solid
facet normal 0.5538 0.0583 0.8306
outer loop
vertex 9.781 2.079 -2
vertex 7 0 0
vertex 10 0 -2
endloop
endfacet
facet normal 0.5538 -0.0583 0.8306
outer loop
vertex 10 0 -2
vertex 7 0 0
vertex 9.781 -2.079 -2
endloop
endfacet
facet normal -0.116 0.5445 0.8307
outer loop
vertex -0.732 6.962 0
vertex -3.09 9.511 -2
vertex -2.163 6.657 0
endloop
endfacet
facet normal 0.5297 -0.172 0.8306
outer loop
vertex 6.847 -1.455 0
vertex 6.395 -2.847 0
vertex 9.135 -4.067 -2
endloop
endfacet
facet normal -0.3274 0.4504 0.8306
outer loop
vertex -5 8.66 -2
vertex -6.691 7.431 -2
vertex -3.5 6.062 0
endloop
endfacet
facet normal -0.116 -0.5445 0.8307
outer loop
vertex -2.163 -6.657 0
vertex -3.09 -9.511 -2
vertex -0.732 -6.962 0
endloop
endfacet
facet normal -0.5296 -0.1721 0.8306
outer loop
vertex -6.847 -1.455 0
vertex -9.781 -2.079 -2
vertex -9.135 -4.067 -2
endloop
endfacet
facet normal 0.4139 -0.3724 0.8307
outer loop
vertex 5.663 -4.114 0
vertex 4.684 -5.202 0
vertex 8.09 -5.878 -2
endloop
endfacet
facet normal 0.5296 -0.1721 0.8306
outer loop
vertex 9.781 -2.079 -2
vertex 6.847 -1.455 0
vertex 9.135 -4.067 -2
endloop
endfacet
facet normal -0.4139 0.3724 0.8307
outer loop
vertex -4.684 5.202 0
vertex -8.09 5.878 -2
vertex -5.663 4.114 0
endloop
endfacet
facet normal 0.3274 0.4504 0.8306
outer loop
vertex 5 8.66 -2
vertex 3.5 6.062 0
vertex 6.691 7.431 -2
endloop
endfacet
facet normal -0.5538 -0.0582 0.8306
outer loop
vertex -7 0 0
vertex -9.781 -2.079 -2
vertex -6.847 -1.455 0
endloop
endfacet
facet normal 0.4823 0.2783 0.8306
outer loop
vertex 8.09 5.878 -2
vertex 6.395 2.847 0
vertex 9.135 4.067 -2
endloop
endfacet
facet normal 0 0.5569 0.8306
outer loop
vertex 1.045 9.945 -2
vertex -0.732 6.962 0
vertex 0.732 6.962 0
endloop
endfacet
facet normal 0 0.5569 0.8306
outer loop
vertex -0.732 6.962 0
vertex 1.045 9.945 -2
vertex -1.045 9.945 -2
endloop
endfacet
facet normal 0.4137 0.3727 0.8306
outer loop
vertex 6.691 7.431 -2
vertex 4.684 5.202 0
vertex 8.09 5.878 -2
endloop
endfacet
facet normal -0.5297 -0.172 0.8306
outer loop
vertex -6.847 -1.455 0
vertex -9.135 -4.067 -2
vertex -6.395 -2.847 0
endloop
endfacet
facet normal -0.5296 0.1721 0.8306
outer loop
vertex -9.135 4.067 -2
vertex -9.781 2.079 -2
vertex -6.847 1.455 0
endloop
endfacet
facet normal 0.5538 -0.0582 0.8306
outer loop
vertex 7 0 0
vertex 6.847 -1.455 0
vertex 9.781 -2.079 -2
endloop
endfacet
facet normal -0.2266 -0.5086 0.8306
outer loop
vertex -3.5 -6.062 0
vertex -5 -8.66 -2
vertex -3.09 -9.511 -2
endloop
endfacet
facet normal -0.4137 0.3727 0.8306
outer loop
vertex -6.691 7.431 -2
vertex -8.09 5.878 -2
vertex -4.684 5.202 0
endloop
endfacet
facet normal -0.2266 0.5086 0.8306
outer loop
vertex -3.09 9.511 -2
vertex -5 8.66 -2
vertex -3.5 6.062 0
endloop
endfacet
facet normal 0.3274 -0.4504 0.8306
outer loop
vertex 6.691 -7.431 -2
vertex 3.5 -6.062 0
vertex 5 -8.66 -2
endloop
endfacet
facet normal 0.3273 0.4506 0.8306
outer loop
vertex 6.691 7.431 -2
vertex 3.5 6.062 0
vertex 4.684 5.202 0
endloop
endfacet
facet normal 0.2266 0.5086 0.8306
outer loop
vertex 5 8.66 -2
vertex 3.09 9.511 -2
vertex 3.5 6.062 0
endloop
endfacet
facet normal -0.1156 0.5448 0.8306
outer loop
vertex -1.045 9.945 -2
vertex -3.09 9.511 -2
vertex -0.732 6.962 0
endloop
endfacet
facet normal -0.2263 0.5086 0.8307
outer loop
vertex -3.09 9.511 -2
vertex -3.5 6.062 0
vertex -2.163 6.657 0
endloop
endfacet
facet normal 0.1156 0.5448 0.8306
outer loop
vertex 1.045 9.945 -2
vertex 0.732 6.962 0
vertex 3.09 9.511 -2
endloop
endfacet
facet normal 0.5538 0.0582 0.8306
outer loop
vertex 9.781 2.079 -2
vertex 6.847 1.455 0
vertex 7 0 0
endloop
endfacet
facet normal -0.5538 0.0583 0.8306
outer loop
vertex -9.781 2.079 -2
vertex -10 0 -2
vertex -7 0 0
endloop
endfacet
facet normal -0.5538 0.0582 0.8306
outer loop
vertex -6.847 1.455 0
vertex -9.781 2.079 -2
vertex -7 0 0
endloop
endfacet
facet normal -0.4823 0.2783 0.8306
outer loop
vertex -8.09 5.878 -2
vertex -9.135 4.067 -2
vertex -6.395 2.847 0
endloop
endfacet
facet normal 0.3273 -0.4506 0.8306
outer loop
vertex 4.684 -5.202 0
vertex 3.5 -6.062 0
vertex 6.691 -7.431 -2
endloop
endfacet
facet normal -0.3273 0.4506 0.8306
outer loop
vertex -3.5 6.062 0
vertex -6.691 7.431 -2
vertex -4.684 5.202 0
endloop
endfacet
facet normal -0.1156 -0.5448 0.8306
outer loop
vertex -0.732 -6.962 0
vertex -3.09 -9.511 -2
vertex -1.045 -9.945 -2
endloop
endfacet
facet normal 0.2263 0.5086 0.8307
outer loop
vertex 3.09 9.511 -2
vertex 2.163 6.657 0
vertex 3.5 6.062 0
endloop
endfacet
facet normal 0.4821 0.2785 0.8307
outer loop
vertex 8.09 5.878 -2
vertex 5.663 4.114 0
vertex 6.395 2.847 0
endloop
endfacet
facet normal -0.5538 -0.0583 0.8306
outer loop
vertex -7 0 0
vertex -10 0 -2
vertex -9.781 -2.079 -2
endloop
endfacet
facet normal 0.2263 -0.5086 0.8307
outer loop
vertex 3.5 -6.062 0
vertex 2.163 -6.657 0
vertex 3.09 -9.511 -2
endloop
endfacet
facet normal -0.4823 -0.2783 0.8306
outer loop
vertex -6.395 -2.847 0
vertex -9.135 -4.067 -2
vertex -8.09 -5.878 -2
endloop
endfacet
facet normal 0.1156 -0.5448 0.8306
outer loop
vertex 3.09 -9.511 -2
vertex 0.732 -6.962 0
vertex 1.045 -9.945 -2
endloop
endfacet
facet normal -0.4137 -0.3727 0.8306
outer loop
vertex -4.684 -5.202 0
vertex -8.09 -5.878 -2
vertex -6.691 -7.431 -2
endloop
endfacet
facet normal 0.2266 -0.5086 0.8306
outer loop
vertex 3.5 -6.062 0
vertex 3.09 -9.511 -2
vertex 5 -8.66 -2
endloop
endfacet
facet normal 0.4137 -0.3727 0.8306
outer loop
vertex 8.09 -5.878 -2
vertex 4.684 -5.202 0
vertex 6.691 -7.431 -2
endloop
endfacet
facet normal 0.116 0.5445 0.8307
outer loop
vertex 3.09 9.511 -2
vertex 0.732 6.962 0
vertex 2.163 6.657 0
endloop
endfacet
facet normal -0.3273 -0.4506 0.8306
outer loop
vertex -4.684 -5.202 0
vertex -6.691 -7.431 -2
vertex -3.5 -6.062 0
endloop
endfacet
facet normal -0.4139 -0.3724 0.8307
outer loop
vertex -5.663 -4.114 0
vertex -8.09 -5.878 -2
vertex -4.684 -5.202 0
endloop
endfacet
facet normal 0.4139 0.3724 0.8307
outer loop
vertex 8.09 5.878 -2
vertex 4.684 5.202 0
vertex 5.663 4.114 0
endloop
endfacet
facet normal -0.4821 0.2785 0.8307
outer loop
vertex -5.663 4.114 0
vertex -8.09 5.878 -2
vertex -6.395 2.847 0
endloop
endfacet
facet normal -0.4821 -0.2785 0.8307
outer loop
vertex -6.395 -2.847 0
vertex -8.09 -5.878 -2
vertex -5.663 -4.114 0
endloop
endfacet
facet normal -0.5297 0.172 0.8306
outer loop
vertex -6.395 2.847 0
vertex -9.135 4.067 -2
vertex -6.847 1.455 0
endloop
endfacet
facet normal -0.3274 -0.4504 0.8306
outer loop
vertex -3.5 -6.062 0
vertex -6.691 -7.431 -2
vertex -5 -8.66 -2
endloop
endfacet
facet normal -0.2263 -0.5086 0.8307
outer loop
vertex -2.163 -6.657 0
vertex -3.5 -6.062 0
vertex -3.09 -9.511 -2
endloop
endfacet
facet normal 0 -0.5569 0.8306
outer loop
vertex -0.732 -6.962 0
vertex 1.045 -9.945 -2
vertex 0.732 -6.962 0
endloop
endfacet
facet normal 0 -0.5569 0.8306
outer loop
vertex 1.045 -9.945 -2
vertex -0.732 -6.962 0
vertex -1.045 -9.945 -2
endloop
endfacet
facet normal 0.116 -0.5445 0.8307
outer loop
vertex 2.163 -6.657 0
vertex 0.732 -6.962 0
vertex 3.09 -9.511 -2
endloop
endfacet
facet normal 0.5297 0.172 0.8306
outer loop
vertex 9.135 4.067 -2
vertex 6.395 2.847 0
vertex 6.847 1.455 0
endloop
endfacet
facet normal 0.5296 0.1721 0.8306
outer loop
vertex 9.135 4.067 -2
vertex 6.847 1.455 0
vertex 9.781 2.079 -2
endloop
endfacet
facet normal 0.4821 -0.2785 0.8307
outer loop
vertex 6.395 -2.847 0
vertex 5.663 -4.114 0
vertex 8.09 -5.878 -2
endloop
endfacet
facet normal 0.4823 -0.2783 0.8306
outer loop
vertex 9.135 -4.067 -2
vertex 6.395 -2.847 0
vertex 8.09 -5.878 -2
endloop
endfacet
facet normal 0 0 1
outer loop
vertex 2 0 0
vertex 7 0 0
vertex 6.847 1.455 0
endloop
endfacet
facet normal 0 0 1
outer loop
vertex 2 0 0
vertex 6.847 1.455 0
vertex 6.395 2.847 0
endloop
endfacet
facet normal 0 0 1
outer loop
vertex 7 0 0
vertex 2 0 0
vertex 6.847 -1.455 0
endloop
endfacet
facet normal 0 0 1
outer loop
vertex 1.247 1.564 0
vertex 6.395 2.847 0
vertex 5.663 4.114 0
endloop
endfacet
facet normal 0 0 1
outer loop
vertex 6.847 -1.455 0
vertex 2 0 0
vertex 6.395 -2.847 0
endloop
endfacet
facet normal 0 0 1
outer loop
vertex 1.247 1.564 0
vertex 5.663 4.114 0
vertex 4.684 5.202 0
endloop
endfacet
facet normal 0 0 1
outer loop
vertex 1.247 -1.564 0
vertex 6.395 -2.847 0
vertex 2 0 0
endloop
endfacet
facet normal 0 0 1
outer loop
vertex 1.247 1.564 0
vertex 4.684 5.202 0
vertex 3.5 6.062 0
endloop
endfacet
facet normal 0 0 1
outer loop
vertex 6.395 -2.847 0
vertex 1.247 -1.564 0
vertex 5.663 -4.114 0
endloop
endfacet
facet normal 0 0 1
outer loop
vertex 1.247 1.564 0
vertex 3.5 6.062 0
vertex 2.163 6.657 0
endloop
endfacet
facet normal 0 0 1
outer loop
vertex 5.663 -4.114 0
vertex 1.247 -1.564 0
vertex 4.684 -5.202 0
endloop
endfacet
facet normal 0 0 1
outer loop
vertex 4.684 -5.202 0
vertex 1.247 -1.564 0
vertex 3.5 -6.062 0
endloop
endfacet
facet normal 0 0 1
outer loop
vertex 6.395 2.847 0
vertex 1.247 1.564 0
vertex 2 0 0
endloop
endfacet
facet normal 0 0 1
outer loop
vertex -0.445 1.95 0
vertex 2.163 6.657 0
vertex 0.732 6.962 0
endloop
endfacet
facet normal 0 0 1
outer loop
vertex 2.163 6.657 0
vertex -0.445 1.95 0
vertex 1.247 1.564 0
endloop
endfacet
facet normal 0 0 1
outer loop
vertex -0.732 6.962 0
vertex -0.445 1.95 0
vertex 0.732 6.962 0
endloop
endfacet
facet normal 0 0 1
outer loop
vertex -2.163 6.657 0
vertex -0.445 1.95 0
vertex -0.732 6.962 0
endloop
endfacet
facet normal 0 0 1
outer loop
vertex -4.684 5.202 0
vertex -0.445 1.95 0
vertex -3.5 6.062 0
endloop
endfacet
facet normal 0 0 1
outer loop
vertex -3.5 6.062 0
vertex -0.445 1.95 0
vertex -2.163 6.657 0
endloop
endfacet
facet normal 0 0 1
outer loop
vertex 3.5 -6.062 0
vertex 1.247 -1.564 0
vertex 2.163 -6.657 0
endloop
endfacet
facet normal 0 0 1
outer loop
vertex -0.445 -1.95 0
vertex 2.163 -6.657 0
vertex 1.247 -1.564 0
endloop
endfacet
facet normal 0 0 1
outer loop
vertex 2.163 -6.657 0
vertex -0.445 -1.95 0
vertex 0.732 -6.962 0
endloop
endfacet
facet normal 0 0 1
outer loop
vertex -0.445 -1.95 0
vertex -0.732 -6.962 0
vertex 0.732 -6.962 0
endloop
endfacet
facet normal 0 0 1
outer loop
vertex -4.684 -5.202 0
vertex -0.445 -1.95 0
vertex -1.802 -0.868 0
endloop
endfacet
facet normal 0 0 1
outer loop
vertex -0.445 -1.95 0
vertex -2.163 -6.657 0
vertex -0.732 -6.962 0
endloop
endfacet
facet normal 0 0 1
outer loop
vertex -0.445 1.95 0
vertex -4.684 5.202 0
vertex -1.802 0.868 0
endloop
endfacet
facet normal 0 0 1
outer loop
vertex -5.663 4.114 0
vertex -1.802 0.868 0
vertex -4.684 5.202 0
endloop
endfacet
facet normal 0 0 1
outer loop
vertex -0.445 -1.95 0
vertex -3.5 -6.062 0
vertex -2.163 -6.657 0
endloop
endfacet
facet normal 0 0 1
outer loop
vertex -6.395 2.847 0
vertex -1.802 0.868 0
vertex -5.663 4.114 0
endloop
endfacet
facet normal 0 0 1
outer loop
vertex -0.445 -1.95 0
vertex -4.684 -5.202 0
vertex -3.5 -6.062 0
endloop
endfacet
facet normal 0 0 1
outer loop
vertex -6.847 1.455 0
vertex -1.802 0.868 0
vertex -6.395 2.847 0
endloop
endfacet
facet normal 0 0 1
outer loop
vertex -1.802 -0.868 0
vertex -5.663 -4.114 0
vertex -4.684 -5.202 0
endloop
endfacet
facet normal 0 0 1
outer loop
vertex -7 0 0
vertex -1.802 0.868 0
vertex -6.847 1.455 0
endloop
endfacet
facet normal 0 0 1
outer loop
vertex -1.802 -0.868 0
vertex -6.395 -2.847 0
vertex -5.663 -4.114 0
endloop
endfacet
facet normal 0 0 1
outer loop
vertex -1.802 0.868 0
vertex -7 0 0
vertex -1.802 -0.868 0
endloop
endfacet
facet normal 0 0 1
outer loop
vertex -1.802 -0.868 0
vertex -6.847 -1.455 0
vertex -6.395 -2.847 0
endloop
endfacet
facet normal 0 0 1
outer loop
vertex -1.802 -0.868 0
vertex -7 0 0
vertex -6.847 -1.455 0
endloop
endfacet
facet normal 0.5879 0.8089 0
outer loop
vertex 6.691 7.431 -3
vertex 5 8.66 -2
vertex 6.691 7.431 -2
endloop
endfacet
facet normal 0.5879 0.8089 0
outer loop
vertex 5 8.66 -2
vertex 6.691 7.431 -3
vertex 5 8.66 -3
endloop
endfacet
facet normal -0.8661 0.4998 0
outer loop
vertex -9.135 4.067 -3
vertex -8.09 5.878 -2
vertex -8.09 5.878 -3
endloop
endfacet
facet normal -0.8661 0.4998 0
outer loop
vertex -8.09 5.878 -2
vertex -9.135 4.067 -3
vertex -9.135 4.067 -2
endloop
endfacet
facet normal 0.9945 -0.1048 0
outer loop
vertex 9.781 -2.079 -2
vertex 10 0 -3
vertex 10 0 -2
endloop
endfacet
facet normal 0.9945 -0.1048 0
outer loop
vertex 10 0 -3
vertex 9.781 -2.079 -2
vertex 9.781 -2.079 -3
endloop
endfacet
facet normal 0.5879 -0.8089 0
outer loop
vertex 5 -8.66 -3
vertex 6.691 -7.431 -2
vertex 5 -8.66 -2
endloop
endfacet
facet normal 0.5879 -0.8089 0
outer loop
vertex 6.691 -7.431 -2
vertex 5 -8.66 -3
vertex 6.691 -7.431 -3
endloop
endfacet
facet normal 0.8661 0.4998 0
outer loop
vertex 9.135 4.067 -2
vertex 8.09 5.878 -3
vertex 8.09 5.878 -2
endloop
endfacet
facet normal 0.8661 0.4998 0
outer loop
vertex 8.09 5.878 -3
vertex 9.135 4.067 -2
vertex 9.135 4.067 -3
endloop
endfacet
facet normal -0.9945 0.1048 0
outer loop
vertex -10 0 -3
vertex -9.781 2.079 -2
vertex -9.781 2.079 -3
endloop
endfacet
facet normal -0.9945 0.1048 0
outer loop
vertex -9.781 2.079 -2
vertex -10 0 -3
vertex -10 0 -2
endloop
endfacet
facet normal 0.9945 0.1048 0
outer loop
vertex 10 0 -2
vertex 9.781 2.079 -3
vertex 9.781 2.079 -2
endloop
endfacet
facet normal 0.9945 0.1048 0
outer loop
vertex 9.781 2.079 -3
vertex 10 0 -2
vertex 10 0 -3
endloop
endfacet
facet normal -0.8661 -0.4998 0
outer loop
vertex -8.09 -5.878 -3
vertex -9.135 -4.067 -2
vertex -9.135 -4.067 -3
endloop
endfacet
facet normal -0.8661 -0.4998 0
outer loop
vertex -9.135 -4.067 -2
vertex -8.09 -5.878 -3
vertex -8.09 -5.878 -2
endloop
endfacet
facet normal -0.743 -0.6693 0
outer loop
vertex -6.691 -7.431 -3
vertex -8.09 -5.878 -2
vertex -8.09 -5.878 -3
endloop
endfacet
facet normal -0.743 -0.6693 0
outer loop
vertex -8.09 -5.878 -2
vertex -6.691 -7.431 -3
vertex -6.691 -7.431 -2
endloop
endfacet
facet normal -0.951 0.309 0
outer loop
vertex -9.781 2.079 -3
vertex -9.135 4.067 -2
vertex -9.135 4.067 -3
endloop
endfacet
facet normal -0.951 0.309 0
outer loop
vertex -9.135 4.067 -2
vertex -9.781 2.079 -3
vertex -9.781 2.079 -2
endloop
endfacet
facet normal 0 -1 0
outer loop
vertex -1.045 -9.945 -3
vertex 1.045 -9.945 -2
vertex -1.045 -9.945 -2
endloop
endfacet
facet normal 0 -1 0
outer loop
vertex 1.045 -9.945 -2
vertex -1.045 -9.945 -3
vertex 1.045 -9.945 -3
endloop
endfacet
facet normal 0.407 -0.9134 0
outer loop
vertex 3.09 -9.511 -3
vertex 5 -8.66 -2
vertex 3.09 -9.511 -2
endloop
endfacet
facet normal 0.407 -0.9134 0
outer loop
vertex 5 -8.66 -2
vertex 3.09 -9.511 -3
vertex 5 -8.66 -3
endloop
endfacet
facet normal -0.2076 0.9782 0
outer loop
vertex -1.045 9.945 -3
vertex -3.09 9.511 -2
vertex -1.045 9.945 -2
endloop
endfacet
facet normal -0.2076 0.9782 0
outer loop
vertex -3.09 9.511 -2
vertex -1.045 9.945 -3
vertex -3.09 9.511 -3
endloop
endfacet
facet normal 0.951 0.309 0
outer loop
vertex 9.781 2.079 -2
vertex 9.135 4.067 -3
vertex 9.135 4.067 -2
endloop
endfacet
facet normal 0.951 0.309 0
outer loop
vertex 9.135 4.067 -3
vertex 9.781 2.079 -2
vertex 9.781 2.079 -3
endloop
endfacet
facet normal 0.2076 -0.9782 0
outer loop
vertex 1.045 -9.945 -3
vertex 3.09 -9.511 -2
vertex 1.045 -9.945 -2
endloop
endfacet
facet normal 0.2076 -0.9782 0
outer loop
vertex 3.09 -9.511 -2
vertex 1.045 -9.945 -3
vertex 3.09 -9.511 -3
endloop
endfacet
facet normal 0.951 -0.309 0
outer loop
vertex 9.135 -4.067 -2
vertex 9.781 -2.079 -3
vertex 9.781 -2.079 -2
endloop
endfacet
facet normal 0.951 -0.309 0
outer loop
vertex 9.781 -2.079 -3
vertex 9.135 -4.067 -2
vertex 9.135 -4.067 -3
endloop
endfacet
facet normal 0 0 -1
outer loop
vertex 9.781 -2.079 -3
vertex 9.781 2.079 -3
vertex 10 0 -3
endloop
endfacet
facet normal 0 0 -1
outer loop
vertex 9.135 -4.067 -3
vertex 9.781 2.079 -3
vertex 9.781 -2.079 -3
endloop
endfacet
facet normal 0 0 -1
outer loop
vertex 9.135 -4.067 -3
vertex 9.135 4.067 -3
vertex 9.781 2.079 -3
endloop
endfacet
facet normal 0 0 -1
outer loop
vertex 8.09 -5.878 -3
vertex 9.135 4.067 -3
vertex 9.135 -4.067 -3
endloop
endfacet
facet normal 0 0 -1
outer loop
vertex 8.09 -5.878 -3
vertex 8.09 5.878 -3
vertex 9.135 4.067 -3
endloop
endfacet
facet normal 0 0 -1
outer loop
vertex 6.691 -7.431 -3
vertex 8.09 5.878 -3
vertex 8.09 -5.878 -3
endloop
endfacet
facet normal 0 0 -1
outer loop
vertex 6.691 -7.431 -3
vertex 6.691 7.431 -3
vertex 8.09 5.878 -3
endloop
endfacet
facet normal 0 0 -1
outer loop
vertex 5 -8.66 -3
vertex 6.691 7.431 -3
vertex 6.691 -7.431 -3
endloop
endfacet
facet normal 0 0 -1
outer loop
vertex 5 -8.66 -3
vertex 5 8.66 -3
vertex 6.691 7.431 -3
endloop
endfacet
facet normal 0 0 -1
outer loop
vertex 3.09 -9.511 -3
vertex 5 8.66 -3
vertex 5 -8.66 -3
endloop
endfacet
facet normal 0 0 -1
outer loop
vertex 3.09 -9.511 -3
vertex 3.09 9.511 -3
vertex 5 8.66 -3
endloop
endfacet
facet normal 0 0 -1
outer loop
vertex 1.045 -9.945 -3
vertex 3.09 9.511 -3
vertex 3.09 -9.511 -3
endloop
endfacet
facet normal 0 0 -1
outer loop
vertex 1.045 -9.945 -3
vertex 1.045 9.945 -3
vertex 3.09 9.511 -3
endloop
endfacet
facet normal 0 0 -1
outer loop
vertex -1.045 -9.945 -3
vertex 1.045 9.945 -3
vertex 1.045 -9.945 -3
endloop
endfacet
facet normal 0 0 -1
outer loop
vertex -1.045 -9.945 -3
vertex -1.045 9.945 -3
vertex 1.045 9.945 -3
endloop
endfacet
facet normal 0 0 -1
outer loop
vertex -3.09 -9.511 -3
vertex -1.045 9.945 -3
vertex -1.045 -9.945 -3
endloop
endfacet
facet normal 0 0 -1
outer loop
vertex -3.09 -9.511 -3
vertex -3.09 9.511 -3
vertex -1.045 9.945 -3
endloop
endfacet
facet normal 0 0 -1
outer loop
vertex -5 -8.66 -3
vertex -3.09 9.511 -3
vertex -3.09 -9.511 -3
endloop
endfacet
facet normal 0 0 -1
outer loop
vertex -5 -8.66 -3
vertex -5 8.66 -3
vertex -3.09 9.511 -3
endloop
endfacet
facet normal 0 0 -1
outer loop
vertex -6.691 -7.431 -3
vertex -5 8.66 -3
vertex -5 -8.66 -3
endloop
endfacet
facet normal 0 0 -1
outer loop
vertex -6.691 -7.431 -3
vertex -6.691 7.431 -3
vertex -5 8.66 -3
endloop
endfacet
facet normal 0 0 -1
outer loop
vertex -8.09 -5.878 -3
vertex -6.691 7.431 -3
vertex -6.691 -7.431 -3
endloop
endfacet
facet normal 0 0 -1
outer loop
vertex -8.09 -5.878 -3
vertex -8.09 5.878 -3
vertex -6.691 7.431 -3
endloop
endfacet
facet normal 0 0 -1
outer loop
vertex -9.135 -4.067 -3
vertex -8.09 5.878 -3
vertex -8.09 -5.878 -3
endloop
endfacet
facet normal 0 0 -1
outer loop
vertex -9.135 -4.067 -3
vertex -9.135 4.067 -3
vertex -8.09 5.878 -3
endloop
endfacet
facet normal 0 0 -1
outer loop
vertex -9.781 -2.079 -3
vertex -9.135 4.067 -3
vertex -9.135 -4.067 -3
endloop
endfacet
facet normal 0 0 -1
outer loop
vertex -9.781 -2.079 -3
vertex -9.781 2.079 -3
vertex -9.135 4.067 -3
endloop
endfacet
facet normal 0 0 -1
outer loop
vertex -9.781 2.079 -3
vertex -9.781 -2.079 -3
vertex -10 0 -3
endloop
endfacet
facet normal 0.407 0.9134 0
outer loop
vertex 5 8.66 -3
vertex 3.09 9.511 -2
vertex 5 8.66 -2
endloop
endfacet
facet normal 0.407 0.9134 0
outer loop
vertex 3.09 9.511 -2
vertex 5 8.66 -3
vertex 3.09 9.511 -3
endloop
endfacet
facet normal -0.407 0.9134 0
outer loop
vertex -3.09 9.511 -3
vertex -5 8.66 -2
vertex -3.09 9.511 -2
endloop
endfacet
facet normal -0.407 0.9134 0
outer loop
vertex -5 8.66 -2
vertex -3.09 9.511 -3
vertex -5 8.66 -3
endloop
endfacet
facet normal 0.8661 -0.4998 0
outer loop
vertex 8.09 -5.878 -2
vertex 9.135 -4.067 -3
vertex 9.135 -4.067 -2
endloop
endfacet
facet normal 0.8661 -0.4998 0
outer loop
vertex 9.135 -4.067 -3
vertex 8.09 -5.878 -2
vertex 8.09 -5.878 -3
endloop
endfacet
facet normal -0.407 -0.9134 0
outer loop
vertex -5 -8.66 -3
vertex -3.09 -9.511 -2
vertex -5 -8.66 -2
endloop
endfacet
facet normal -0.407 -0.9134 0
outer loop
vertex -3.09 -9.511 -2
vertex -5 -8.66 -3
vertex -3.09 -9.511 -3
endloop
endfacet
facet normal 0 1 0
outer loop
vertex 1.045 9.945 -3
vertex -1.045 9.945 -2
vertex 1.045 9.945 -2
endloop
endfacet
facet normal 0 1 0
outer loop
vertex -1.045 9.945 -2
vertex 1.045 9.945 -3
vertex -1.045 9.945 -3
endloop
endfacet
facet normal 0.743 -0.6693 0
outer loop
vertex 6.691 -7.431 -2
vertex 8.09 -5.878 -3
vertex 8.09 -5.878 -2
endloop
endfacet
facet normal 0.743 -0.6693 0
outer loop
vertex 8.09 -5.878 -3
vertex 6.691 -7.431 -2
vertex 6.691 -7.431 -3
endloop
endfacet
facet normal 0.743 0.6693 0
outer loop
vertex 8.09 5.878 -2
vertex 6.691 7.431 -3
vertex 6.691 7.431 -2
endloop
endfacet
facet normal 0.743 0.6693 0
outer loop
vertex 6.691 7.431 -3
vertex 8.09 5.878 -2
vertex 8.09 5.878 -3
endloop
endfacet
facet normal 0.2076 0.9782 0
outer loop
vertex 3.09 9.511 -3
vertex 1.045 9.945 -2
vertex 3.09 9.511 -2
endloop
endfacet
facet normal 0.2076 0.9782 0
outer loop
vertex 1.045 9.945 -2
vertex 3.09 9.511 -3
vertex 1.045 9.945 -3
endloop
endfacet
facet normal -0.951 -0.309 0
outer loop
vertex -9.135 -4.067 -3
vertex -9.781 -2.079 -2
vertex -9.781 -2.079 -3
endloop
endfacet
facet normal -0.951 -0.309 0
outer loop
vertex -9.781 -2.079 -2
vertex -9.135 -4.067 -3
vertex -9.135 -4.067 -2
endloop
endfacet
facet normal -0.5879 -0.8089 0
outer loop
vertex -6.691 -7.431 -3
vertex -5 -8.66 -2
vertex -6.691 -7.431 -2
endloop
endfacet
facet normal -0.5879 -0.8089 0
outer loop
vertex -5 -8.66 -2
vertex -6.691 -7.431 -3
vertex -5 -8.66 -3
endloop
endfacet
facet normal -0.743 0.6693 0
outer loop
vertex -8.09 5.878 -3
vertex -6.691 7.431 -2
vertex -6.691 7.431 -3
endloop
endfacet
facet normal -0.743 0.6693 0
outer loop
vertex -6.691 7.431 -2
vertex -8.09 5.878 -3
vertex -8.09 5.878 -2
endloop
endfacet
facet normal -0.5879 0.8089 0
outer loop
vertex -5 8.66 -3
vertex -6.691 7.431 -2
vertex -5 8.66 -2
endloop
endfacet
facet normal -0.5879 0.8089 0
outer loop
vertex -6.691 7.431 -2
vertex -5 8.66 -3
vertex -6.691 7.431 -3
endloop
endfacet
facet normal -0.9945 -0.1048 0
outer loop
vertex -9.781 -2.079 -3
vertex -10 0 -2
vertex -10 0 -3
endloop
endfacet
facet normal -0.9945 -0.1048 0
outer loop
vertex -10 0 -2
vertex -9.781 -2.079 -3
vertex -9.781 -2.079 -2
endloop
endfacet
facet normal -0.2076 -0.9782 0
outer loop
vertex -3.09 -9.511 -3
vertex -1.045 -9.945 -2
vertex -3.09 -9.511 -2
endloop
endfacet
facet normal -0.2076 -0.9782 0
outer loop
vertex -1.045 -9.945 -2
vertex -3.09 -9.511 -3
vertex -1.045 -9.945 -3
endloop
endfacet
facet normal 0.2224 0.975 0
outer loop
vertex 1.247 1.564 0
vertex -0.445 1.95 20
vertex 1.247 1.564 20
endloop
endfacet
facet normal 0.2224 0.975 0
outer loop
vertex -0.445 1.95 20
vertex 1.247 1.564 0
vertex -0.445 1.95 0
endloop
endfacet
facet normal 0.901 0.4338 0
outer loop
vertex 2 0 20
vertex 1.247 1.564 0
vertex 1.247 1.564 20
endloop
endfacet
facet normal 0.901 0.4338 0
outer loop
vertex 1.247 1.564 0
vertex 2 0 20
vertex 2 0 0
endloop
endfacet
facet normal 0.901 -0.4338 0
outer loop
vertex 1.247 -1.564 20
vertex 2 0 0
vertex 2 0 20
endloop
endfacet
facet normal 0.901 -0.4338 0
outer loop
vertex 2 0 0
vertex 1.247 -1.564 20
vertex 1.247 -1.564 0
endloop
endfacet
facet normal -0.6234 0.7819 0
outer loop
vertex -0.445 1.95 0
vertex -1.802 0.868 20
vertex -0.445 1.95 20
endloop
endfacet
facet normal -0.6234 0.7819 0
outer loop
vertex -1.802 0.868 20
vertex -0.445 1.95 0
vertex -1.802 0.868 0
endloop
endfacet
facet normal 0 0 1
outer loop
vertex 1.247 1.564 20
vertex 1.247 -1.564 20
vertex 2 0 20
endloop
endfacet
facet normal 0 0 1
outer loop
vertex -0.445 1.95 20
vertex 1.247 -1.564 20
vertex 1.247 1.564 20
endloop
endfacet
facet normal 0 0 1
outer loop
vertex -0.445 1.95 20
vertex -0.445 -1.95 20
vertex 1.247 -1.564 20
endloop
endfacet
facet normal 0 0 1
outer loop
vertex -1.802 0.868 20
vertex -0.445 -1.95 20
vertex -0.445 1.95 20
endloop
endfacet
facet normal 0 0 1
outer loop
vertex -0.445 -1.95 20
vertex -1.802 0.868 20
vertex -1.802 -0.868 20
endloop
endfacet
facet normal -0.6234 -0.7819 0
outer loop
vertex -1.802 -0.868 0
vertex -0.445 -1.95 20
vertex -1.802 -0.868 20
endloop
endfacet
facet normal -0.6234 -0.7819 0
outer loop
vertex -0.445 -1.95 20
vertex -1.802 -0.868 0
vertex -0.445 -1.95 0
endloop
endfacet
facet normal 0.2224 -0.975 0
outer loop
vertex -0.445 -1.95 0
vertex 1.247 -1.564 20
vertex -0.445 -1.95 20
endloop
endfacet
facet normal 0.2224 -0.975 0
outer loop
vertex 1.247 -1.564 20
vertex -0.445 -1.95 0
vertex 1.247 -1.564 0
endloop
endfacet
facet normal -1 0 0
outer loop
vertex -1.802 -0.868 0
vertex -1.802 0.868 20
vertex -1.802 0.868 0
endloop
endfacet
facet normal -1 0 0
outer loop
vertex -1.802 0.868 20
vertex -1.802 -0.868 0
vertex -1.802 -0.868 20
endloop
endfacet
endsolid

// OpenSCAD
/* Permet de contruire une tige permettant d'enlever le RPI ou autre
By jeff le 10/2017
*/
 

//Declaration des variables

//HEIGHT (mm).		
_height = 20; //[1:200]





//Base
translate([0,0,-2]){

	cylinder(h=2,r1=10,,r2=7,center=false);

	translate([0,0,-1]){
		cylinder(h=1,r1=10,r2=10,center=false);
	}
}


//Tige
cylinder(h=_height,r=2,center=false);
